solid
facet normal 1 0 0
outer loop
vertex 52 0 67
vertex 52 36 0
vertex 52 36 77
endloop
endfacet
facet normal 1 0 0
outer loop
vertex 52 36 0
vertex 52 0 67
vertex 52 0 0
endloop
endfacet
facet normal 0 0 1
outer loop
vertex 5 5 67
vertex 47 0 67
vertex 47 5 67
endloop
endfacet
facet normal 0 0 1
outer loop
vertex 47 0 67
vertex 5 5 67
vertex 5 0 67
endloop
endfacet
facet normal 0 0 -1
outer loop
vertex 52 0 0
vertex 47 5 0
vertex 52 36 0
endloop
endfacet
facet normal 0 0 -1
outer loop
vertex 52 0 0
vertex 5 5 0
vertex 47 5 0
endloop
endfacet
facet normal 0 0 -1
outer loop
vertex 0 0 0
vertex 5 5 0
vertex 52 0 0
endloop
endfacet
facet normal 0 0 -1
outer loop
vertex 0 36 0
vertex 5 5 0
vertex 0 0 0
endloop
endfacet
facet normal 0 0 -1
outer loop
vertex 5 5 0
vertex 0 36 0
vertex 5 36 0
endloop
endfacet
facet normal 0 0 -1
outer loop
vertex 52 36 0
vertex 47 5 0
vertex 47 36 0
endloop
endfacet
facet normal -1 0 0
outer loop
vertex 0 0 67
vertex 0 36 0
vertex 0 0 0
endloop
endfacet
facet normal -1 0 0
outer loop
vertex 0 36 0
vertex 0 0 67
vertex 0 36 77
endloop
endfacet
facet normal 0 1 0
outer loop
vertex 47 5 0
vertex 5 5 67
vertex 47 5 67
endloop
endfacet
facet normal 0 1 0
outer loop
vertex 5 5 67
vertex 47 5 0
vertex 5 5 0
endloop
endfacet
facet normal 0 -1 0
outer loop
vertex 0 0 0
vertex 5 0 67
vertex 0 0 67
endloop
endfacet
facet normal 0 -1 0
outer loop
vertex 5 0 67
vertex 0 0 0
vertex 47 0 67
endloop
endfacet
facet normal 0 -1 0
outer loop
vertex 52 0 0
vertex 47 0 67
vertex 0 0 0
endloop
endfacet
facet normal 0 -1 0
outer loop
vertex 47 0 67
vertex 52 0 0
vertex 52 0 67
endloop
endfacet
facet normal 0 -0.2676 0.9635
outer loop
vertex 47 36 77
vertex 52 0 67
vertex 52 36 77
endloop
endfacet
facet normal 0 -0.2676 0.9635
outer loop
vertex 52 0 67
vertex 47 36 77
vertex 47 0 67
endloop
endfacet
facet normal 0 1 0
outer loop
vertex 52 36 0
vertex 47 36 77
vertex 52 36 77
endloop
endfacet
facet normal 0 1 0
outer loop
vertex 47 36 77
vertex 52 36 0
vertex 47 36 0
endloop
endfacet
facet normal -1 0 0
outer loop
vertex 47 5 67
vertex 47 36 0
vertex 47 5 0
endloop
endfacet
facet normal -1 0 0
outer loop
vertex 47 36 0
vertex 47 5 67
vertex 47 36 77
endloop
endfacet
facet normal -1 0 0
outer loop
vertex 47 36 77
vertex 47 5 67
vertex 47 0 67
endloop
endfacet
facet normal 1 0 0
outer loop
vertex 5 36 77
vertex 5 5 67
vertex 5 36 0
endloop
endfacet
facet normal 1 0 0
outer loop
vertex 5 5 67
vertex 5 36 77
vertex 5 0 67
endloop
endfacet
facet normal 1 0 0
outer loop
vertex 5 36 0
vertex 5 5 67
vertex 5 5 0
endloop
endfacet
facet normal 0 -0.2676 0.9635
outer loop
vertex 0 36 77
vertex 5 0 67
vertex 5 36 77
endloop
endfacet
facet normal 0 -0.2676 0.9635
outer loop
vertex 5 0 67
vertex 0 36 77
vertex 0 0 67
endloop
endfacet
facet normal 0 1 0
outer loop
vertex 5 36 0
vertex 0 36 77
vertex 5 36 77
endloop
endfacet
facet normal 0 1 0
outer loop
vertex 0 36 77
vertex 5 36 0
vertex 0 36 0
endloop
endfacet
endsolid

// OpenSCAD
y_size = 36;
z_size = 67;
x_size = 42 + 5 + 5;

// Basic shape
union() {
    cube([x_size, 5, z_size], center = false);
    
    translate([ x_size,0,0])
    rotate([0,270,0])
    linear_extrude(5)
        polygon([[0,0],[0,y_size],[z_size+10,y_size],[z_size,0]]);
    
    
    translate([ 5,0,0])
    rotate([0,270,0])
    linear_extrude(5)
        polygon([[0,0],[0,y_size],[z_size+10,y_size],[z_size,0]]);
}
